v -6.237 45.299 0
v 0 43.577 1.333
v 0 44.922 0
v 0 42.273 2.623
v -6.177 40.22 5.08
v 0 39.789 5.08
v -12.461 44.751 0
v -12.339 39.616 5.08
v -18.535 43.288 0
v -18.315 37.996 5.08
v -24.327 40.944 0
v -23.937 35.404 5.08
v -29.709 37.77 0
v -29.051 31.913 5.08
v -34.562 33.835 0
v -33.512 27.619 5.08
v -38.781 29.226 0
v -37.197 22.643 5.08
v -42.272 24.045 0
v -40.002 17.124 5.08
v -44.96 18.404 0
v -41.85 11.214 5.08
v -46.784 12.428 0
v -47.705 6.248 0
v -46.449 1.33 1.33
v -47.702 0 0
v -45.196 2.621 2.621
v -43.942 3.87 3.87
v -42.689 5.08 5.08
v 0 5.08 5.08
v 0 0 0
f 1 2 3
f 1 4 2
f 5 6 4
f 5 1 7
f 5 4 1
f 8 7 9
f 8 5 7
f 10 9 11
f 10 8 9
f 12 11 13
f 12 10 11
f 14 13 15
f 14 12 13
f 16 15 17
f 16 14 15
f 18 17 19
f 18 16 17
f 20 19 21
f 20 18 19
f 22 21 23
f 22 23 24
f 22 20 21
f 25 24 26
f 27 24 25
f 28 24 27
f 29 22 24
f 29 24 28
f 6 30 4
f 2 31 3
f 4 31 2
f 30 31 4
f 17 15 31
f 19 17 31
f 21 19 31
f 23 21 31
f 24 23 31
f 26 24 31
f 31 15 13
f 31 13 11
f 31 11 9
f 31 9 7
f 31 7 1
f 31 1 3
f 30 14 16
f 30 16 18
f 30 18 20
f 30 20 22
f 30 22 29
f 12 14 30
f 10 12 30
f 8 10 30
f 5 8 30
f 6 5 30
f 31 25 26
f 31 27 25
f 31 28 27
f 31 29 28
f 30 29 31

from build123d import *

# Parameters (mm, degrees)
F1_DEPTH = 5.08
F2_SIZE  = 5.07999


# Not quite as in the source:
# - a fillet or chamfer is up to 0.001 mm smaller than in the source, because OpenCascade refuses the exact size


with BuildPart() as f1:
    # F0 (on Top) → F1 (new body)
    with BuildSketch(Plane.XY):
        with BuildLine():
            Line((0, 0), (0, 44.9222251773))
            ThreePointArc((0, 44.9222251773), (-34.5622433169, 33.8350362208), (-47.7024391294, 0))
            Line((-47.7024391294, 0), (0, 0))
        make_face()
    extrude(amount=F1_DEPTH)

    # F2 (size 5.08 in the source; OpenCascade refuses exactly that, so slightly less here)
    f2_edges = [f1.edges().sort_by_distance(p)[0] for p in [
        (-34.562243, 33.835036, 5.08),
        (-23.85122, 0, 5.08),
    ]]
    chamfer(f2_edges, length=F2_SIZE)


solid = f1.part
